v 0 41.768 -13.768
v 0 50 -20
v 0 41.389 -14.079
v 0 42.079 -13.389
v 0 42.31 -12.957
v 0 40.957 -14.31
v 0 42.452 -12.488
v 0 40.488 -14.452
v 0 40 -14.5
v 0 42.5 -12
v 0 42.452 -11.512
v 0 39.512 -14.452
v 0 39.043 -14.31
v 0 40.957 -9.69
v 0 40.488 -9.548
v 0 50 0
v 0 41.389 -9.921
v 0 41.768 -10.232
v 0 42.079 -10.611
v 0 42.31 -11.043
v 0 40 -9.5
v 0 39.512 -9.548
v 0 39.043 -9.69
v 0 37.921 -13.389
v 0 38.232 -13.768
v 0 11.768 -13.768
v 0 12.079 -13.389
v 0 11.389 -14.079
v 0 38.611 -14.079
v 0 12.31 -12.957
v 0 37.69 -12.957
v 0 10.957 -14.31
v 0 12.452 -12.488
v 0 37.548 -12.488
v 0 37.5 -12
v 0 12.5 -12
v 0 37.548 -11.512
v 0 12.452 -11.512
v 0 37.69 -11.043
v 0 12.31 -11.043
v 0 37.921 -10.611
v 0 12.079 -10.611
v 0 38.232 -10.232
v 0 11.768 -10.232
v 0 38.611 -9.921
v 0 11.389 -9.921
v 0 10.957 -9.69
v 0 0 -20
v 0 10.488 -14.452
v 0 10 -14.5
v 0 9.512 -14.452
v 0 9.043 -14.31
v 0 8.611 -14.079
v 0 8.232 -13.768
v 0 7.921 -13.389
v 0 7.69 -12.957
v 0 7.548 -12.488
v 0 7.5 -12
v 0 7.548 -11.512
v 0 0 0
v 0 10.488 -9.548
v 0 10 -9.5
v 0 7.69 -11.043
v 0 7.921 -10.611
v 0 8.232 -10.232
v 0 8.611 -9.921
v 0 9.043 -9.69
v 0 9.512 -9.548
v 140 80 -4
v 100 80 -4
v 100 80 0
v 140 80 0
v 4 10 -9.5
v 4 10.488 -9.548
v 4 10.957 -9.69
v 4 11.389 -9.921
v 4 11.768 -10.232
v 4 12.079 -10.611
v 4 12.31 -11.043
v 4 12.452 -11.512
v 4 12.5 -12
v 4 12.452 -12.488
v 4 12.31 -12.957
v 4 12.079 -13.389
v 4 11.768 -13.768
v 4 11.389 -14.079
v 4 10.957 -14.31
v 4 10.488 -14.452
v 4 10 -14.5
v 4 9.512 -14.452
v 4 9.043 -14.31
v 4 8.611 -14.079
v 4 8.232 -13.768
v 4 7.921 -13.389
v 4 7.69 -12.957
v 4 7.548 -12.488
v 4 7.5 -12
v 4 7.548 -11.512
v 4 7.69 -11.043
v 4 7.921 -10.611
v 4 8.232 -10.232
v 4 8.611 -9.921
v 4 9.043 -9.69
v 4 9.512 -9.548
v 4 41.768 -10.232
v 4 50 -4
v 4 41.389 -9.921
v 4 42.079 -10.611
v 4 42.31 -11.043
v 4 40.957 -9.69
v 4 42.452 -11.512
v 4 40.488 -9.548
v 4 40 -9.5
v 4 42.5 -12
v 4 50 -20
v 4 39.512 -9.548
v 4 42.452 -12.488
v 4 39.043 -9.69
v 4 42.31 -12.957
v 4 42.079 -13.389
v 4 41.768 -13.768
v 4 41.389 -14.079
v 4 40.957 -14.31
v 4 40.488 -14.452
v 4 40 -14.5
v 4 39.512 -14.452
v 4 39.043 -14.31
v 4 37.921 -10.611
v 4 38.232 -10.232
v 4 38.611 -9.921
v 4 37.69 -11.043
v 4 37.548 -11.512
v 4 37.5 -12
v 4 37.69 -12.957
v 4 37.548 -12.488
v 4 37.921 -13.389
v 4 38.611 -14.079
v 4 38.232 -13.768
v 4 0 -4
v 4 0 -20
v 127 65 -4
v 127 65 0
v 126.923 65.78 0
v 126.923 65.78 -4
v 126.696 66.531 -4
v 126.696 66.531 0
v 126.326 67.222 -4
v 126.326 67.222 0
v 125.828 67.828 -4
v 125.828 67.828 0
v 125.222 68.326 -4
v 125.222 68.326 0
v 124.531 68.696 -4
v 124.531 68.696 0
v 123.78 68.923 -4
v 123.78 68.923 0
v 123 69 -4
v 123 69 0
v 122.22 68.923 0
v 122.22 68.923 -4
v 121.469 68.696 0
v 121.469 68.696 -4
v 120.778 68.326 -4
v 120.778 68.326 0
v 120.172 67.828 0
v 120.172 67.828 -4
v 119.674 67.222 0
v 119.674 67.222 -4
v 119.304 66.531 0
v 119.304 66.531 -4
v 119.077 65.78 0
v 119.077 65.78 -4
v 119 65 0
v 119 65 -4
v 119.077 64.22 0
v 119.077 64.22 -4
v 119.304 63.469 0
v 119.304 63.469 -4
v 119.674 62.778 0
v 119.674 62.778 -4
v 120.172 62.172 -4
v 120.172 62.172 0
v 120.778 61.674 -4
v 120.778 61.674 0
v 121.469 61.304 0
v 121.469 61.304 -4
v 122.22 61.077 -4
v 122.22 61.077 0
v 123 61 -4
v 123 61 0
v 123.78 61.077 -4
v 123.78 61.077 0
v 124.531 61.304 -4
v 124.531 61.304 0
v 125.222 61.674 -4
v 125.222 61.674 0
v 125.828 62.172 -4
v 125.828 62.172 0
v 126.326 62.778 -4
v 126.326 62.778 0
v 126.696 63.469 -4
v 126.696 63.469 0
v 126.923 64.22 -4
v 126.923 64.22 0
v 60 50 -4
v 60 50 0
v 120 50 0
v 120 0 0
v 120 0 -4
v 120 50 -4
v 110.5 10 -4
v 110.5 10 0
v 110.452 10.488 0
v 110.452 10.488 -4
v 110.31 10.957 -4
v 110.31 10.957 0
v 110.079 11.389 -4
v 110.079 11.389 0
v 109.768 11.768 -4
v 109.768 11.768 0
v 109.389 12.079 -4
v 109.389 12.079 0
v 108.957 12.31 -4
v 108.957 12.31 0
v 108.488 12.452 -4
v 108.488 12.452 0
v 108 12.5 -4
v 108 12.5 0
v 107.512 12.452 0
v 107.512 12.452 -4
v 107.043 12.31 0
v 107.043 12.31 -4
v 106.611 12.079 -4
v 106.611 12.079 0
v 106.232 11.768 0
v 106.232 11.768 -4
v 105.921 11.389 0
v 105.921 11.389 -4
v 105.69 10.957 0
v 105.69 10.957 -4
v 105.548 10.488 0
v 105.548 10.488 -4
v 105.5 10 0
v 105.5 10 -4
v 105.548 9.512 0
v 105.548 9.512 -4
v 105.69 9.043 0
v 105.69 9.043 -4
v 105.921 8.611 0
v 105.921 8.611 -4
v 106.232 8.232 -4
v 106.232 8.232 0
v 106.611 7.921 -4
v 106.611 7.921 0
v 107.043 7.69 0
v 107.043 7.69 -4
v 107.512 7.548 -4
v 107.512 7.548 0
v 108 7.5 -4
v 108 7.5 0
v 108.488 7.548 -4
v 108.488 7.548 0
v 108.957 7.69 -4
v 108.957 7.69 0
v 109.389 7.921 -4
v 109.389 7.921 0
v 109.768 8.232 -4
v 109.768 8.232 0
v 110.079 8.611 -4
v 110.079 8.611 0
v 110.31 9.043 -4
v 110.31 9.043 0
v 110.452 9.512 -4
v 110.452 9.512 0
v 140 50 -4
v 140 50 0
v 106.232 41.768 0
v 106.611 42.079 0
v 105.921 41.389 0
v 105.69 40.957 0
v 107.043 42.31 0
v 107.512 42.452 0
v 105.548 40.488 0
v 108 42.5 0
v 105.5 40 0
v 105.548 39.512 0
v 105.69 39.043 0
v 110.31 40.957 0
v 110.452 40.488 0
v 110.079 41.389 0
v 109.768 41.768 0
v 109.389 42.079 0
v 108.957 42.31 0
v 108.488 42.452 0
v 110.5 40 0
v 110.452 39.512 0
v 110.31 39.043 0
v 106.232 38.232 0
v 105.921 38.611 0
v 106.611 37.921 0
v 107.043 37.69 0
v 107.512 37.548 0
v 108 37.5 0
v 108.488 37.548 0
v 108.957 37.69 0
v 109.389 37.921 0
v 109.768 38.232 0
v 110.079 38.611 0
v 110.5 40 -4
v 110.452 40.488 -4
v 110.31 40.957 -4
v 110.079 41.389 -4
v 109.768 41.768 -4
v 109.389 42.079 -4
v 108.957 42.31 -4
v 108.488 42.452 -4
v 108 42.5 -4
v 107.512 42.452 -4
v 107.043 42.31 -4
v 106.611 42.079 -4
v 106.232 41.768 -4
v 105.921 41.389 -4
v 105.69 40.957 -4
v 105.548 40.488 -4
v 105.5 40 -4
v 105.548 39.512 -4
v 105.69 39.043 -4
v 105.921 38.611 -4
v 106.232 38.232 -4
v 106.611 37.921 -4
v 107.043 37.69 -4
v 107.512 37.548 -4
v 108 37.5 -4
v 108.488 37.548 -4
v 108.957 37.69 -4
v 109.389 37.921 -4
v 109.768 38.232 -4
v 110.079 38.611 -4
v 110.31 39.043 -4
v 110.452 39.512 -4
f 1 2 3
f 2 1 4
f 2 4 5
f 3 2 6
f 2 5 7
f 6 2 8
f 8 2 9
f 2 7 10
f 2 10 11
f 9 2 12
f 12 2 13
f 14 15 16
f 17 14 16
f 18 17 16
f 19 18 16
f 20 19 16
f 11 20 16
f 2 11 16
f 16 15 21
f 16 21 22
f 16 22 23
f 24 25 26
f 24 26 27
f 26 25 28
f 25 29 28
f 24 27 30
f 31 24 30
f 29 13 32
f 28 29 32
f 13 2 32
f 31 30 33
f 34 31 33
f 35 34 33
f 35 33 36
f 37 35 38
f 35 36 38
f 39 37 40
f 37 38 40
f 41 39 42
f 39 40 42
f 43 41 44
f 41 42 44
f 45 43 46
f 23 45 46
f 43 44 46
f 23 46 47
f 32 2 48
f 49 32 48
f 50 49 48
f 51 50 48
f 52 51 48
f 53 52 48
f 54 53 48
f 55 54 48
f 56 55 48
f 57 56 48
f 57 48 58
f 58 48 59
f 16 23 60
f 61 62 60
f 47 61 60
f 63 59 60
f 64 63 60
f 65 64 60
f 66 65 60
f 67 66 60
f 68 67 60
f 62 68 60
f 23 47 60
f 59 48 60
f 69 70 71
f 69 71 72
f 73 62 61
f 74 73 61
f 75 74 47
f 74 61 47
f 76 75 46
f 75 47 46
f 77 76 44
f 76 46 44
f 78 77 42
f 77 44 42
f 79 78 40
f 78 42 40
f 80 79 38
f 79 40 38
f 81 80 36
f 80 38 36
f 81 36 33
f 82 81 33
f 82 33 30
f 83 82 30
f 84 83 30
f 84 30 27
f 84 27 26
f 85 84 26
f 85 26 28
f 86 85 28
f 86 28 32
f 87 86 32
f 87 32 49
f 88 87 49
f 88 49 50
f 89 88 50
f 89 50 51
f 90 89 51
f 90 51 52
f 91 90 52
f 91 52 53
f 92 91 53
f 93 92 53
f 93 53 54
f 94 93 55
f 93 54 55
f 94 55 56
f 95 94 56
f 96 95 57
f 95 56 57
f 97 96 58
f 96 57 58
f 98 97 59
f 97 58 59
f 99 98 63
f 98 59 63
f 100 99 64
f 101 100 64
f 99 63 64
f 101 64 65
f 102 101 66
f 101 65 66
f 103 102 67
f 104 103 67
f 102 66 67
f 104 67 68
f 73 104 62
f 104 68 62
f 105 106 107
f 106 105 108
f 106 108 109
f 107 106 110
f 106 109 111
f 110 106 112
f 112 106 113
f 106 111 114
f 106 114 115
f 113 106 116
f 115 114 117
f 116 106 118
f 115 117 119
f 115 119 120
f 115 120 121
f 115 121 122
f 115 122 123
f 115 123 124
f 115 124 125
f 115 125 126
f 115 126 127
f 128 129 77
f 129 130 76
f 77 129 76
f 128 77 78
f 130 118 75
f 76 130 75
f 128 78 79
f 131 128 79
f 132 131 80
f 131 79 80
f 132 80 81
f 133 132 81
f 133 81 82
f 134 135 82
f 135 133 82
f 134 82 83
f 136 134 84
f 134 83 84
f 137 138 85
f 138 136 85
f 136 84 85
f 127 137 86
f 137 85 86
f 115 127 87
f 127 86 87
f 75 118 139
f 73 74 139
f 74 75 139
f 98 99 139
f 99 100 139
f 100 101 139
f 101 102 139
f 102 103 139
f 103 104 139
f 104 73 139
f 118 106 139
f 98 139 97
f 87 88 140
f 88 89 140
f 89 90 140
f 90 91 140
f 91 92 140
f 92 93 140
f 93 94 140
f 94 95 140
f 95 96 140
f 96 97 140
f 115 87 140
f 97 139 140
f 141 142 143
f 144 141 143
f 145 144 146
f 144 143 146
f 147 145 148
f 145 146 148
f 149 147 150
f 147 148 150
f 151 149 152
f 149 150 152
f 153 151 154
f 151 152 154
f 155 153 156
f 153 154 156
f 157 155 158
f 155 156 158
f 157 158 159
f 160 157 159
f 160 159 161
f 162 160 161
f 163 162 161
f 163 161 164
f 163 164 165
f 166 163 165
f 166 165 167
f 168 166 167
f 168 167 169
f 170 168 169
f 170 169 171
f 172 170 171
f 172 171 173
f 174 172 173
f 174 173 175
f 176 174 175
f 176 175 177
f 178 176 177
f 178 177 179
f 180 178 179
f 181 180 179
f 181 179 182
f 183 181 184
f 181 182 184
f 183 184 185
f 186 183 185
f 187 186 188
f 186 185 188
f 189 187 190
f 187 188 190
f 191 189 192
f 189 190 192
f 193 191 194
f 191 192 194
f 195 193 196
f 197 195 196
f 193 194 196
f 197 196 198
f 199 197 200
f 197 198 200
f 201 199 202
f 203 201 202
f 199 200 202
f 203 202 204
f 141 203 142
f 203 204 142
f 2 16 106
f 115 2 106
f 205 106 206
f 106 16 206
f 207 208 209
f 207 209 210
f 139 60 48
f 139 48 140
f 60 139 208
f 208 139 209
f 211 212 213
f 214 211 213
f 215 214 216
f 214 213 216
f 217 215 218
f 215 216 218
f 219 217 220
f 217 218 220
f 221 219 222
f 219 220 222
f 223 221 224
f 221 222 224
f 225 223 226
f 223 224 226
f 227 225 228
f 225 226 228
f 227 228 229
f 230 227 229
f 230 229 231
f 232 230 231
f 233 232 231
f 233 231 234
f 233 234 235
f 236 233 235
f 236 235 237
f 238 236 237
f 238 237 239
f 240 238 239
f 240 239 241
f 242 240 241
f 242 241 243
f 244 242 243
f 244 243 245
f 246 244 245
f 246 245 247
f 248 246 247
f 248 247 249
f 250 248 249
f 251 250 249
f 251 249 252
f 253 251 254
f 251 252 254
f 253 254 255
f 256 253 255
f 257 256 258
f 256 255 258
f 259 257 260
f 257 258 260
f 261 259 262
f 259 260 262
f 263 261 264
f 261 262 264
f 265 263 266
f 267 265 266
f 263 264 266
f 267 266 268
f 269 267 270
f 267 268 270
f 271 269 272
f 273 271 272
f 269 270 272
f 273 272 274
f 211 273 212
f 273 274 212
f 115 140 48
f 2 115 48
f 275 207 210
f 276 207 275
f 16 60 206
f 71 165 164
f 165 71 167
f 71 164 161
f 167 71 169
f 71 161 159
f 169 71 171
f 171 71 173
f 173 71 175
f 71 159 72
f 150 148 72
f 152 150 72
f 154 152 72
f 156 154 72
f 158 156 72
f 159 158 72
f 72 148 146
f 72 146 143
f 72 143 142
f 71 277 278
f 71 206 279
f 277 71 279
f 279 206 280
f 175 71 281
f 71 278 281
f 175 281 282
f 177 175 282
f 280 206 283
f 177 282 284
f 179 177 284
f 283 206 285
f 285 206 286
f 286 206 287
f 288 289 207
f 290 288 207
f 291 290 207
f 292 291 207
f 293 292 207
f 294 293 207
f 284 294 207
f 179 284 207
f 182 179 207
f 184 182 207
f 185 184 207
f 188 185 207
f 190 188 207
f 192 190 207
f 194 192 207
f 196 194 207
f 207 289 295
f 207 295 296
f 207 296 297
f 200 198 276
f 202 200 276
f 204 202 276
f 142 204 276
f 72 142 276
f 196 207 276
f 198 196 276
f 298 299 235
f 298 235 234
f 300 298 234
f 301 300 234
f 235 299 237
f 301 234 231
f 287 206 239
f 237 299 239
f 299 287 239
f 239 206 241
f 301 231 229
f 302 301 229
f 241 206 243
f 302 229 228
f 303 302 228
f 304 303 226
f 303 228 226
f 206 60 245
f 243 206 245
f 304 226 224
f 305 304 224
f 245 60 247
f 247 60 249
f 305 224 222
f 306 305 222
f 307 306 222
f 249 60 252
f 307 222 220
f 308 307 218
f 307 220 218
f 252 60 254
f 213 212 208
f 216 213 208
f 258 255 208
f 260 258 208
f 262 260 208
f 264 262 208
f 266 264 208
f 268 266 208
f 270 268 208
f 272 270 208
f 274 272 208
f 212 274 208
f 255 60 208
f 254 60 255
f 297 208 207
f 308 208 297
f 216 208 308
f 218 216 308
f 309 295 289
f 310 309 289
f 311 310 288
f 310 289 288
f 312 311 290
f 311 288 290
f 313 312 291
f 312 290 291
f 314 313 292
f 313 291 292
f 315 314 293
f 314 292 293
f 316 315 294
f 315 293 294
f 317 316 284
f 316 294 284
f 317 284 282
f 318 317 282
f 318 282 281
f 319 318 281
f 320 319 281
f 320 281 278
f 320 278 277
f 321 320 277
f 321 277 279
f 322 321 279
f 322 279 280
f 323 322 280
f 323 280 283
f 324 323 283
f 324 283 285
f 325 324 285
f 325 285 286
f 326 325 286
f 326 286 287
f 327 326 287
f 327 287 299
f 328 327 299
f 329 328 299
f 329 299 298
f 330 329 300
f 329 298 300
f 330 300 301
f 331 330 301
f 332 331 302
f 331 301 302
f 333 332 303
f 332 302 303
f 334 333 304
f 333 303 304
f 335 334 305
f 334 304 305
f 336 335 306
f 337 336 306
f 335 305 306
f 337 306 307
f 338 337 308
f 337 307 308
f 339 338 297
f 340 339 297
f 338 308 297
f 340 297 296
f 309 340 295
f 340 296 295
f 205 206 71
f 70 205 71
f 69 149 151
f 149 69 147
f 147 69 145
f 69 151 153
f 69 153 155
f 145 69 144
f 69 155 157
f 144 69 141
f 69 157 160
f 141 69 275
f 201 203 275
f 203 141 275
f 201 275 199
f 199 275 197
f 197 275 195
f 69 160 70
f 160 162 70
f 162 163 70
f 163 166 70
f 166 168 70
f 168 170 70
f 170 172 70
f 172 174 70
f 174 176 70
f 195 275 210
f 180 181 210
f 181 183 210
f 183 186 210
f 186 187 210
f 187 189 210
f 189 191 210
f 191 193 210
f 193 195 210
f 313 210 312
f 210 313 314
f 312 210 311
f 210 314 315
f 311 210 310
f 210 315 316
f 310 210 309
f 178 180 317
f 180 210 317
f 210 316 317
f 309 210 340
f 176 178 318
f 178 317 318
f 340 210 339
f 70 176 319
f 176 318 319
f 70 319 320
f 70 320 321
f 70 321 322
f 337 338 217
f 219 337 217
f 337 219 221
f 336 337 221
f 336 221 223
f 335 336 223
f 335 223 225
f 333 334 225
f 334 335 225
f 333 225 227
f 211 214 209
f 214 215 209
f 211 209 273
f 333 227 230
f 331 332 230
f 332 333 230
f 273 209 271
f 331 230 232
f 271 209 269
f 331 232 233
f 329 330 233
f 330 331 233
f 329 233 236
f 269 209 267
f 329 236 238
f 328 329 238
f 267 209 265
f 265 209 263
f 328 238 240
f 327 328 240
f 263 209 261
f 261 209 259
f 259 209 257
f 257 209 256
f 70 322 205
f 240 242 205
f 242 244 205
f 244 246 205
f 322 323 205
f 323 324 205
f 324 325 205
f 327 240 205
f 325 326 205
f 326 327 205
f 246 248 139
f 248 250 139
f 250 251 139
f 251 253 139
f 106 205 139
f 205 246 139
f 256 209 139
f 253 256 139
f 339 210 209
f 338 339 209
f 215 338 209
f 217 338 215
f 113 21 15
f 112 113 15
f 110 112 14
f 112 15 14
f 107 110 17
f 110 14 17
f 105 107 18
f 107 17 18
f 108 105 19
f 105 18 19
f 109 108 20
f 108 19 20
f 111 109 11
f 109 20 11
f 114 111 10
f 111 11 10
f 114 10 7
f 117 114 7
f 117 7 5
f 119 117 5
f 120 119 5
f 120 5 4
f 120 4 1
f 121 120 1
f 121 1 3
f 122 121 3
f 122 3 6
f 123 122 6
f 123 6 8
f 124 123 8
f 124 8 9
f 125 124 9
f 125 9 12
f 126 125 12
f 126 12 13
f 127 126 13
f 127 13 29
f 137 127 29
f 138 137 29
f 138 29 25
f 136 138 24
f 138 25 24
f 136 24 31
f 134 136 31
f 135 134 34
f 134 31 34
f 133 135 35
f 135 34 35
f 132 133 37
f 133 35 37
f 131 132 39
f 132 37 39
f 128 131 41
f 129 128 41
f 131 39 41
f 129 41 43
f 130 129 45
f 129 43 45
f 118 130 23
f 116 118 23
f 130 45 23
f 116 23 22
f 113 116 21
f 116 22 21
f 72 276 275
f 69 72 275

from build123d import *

# Parameters (mm, degrees)
EXTRUDE_1_DEPTH     = 80
SKETCH_2_R          = 2.5
CUT_EXTRUDE_1_DEPTH = 10
SKETCH_3_R          = 2.5
SKETCH_3_R_2        = 4
CUT_EXTRUDE_2_DEPTH = 10
CUT_EXTRUDE_3_DEPTH = 30
SKETCH_5_W          = 20
SKETCH_5_H          = 50
CUT_EXTRUDE_4_DEPTH = 10


with BuildPart() as part:
    # Эскиз1 → Бобышка-Вытянуть1 (new body)
    with BuildSketch(Plane(origin=(0, 0, 0), x_dir=(1, 0, 0), z_dir=(0, 1, 0))):
        Polygon((0, 0), (140, 0), (140, 4), (4, 4), (4, 20), (0, 20), (0, 4), align=None)
    extrude(amount=EXTRUDE_1_DEPTH)

    # Эскиз2 → Вырез-Вытянуть1 (cut)
    with BuildSketch(Plane.ZY):
        with Locations((-12, 40)):
            Circle(SKETCH_2_R)
        with Locations((-12, 10)):
            Circle(SKETCH_2_R)
    extrude(amount=-CUT_EXTRUDE_1_DEPTH, mode=Mode.SUBTRACT)

    # Эскиз3 → Вырез-Вытянуть2 (cut)
    with BuildSketch(Plane.XY):
        with Locations((108, 40)):
            Circle(SKETCH_3_R)
        with Locations((108, 10)):
            Circle(SKETCH_3_R)
        with Locations((123, 65)):
            Circle(SKETCH_3_R_2)
    extrude(amount=-CUT_EXTRUDE_2_DEPTH, mode=Mode.SUBTRACT)

    # Эскиз4 → Вырез-Вытянуть3 (cut)
    with BuildSketch(Plane.XY):
        Polygon((0, 50), (60, 50), (100, 80), (0, 80), align=None)
    extrude(amount=-CUT_EXTRUDE_3_DEPTH, mode=Mode.SUBTRACT)

    # Эскиз5 → Вырез-Вытянуть4 (cut)
    with BuildSketch(Plane.XY):
        with Locations((130, 25)):
            Rectangle(SKETCH_5_W, SKETCH_5_H)
    extrude(amount=-CUT_EXTRUDE_4_DEPTH, mode=Mode.SUBTRACT)


solid = part.part
